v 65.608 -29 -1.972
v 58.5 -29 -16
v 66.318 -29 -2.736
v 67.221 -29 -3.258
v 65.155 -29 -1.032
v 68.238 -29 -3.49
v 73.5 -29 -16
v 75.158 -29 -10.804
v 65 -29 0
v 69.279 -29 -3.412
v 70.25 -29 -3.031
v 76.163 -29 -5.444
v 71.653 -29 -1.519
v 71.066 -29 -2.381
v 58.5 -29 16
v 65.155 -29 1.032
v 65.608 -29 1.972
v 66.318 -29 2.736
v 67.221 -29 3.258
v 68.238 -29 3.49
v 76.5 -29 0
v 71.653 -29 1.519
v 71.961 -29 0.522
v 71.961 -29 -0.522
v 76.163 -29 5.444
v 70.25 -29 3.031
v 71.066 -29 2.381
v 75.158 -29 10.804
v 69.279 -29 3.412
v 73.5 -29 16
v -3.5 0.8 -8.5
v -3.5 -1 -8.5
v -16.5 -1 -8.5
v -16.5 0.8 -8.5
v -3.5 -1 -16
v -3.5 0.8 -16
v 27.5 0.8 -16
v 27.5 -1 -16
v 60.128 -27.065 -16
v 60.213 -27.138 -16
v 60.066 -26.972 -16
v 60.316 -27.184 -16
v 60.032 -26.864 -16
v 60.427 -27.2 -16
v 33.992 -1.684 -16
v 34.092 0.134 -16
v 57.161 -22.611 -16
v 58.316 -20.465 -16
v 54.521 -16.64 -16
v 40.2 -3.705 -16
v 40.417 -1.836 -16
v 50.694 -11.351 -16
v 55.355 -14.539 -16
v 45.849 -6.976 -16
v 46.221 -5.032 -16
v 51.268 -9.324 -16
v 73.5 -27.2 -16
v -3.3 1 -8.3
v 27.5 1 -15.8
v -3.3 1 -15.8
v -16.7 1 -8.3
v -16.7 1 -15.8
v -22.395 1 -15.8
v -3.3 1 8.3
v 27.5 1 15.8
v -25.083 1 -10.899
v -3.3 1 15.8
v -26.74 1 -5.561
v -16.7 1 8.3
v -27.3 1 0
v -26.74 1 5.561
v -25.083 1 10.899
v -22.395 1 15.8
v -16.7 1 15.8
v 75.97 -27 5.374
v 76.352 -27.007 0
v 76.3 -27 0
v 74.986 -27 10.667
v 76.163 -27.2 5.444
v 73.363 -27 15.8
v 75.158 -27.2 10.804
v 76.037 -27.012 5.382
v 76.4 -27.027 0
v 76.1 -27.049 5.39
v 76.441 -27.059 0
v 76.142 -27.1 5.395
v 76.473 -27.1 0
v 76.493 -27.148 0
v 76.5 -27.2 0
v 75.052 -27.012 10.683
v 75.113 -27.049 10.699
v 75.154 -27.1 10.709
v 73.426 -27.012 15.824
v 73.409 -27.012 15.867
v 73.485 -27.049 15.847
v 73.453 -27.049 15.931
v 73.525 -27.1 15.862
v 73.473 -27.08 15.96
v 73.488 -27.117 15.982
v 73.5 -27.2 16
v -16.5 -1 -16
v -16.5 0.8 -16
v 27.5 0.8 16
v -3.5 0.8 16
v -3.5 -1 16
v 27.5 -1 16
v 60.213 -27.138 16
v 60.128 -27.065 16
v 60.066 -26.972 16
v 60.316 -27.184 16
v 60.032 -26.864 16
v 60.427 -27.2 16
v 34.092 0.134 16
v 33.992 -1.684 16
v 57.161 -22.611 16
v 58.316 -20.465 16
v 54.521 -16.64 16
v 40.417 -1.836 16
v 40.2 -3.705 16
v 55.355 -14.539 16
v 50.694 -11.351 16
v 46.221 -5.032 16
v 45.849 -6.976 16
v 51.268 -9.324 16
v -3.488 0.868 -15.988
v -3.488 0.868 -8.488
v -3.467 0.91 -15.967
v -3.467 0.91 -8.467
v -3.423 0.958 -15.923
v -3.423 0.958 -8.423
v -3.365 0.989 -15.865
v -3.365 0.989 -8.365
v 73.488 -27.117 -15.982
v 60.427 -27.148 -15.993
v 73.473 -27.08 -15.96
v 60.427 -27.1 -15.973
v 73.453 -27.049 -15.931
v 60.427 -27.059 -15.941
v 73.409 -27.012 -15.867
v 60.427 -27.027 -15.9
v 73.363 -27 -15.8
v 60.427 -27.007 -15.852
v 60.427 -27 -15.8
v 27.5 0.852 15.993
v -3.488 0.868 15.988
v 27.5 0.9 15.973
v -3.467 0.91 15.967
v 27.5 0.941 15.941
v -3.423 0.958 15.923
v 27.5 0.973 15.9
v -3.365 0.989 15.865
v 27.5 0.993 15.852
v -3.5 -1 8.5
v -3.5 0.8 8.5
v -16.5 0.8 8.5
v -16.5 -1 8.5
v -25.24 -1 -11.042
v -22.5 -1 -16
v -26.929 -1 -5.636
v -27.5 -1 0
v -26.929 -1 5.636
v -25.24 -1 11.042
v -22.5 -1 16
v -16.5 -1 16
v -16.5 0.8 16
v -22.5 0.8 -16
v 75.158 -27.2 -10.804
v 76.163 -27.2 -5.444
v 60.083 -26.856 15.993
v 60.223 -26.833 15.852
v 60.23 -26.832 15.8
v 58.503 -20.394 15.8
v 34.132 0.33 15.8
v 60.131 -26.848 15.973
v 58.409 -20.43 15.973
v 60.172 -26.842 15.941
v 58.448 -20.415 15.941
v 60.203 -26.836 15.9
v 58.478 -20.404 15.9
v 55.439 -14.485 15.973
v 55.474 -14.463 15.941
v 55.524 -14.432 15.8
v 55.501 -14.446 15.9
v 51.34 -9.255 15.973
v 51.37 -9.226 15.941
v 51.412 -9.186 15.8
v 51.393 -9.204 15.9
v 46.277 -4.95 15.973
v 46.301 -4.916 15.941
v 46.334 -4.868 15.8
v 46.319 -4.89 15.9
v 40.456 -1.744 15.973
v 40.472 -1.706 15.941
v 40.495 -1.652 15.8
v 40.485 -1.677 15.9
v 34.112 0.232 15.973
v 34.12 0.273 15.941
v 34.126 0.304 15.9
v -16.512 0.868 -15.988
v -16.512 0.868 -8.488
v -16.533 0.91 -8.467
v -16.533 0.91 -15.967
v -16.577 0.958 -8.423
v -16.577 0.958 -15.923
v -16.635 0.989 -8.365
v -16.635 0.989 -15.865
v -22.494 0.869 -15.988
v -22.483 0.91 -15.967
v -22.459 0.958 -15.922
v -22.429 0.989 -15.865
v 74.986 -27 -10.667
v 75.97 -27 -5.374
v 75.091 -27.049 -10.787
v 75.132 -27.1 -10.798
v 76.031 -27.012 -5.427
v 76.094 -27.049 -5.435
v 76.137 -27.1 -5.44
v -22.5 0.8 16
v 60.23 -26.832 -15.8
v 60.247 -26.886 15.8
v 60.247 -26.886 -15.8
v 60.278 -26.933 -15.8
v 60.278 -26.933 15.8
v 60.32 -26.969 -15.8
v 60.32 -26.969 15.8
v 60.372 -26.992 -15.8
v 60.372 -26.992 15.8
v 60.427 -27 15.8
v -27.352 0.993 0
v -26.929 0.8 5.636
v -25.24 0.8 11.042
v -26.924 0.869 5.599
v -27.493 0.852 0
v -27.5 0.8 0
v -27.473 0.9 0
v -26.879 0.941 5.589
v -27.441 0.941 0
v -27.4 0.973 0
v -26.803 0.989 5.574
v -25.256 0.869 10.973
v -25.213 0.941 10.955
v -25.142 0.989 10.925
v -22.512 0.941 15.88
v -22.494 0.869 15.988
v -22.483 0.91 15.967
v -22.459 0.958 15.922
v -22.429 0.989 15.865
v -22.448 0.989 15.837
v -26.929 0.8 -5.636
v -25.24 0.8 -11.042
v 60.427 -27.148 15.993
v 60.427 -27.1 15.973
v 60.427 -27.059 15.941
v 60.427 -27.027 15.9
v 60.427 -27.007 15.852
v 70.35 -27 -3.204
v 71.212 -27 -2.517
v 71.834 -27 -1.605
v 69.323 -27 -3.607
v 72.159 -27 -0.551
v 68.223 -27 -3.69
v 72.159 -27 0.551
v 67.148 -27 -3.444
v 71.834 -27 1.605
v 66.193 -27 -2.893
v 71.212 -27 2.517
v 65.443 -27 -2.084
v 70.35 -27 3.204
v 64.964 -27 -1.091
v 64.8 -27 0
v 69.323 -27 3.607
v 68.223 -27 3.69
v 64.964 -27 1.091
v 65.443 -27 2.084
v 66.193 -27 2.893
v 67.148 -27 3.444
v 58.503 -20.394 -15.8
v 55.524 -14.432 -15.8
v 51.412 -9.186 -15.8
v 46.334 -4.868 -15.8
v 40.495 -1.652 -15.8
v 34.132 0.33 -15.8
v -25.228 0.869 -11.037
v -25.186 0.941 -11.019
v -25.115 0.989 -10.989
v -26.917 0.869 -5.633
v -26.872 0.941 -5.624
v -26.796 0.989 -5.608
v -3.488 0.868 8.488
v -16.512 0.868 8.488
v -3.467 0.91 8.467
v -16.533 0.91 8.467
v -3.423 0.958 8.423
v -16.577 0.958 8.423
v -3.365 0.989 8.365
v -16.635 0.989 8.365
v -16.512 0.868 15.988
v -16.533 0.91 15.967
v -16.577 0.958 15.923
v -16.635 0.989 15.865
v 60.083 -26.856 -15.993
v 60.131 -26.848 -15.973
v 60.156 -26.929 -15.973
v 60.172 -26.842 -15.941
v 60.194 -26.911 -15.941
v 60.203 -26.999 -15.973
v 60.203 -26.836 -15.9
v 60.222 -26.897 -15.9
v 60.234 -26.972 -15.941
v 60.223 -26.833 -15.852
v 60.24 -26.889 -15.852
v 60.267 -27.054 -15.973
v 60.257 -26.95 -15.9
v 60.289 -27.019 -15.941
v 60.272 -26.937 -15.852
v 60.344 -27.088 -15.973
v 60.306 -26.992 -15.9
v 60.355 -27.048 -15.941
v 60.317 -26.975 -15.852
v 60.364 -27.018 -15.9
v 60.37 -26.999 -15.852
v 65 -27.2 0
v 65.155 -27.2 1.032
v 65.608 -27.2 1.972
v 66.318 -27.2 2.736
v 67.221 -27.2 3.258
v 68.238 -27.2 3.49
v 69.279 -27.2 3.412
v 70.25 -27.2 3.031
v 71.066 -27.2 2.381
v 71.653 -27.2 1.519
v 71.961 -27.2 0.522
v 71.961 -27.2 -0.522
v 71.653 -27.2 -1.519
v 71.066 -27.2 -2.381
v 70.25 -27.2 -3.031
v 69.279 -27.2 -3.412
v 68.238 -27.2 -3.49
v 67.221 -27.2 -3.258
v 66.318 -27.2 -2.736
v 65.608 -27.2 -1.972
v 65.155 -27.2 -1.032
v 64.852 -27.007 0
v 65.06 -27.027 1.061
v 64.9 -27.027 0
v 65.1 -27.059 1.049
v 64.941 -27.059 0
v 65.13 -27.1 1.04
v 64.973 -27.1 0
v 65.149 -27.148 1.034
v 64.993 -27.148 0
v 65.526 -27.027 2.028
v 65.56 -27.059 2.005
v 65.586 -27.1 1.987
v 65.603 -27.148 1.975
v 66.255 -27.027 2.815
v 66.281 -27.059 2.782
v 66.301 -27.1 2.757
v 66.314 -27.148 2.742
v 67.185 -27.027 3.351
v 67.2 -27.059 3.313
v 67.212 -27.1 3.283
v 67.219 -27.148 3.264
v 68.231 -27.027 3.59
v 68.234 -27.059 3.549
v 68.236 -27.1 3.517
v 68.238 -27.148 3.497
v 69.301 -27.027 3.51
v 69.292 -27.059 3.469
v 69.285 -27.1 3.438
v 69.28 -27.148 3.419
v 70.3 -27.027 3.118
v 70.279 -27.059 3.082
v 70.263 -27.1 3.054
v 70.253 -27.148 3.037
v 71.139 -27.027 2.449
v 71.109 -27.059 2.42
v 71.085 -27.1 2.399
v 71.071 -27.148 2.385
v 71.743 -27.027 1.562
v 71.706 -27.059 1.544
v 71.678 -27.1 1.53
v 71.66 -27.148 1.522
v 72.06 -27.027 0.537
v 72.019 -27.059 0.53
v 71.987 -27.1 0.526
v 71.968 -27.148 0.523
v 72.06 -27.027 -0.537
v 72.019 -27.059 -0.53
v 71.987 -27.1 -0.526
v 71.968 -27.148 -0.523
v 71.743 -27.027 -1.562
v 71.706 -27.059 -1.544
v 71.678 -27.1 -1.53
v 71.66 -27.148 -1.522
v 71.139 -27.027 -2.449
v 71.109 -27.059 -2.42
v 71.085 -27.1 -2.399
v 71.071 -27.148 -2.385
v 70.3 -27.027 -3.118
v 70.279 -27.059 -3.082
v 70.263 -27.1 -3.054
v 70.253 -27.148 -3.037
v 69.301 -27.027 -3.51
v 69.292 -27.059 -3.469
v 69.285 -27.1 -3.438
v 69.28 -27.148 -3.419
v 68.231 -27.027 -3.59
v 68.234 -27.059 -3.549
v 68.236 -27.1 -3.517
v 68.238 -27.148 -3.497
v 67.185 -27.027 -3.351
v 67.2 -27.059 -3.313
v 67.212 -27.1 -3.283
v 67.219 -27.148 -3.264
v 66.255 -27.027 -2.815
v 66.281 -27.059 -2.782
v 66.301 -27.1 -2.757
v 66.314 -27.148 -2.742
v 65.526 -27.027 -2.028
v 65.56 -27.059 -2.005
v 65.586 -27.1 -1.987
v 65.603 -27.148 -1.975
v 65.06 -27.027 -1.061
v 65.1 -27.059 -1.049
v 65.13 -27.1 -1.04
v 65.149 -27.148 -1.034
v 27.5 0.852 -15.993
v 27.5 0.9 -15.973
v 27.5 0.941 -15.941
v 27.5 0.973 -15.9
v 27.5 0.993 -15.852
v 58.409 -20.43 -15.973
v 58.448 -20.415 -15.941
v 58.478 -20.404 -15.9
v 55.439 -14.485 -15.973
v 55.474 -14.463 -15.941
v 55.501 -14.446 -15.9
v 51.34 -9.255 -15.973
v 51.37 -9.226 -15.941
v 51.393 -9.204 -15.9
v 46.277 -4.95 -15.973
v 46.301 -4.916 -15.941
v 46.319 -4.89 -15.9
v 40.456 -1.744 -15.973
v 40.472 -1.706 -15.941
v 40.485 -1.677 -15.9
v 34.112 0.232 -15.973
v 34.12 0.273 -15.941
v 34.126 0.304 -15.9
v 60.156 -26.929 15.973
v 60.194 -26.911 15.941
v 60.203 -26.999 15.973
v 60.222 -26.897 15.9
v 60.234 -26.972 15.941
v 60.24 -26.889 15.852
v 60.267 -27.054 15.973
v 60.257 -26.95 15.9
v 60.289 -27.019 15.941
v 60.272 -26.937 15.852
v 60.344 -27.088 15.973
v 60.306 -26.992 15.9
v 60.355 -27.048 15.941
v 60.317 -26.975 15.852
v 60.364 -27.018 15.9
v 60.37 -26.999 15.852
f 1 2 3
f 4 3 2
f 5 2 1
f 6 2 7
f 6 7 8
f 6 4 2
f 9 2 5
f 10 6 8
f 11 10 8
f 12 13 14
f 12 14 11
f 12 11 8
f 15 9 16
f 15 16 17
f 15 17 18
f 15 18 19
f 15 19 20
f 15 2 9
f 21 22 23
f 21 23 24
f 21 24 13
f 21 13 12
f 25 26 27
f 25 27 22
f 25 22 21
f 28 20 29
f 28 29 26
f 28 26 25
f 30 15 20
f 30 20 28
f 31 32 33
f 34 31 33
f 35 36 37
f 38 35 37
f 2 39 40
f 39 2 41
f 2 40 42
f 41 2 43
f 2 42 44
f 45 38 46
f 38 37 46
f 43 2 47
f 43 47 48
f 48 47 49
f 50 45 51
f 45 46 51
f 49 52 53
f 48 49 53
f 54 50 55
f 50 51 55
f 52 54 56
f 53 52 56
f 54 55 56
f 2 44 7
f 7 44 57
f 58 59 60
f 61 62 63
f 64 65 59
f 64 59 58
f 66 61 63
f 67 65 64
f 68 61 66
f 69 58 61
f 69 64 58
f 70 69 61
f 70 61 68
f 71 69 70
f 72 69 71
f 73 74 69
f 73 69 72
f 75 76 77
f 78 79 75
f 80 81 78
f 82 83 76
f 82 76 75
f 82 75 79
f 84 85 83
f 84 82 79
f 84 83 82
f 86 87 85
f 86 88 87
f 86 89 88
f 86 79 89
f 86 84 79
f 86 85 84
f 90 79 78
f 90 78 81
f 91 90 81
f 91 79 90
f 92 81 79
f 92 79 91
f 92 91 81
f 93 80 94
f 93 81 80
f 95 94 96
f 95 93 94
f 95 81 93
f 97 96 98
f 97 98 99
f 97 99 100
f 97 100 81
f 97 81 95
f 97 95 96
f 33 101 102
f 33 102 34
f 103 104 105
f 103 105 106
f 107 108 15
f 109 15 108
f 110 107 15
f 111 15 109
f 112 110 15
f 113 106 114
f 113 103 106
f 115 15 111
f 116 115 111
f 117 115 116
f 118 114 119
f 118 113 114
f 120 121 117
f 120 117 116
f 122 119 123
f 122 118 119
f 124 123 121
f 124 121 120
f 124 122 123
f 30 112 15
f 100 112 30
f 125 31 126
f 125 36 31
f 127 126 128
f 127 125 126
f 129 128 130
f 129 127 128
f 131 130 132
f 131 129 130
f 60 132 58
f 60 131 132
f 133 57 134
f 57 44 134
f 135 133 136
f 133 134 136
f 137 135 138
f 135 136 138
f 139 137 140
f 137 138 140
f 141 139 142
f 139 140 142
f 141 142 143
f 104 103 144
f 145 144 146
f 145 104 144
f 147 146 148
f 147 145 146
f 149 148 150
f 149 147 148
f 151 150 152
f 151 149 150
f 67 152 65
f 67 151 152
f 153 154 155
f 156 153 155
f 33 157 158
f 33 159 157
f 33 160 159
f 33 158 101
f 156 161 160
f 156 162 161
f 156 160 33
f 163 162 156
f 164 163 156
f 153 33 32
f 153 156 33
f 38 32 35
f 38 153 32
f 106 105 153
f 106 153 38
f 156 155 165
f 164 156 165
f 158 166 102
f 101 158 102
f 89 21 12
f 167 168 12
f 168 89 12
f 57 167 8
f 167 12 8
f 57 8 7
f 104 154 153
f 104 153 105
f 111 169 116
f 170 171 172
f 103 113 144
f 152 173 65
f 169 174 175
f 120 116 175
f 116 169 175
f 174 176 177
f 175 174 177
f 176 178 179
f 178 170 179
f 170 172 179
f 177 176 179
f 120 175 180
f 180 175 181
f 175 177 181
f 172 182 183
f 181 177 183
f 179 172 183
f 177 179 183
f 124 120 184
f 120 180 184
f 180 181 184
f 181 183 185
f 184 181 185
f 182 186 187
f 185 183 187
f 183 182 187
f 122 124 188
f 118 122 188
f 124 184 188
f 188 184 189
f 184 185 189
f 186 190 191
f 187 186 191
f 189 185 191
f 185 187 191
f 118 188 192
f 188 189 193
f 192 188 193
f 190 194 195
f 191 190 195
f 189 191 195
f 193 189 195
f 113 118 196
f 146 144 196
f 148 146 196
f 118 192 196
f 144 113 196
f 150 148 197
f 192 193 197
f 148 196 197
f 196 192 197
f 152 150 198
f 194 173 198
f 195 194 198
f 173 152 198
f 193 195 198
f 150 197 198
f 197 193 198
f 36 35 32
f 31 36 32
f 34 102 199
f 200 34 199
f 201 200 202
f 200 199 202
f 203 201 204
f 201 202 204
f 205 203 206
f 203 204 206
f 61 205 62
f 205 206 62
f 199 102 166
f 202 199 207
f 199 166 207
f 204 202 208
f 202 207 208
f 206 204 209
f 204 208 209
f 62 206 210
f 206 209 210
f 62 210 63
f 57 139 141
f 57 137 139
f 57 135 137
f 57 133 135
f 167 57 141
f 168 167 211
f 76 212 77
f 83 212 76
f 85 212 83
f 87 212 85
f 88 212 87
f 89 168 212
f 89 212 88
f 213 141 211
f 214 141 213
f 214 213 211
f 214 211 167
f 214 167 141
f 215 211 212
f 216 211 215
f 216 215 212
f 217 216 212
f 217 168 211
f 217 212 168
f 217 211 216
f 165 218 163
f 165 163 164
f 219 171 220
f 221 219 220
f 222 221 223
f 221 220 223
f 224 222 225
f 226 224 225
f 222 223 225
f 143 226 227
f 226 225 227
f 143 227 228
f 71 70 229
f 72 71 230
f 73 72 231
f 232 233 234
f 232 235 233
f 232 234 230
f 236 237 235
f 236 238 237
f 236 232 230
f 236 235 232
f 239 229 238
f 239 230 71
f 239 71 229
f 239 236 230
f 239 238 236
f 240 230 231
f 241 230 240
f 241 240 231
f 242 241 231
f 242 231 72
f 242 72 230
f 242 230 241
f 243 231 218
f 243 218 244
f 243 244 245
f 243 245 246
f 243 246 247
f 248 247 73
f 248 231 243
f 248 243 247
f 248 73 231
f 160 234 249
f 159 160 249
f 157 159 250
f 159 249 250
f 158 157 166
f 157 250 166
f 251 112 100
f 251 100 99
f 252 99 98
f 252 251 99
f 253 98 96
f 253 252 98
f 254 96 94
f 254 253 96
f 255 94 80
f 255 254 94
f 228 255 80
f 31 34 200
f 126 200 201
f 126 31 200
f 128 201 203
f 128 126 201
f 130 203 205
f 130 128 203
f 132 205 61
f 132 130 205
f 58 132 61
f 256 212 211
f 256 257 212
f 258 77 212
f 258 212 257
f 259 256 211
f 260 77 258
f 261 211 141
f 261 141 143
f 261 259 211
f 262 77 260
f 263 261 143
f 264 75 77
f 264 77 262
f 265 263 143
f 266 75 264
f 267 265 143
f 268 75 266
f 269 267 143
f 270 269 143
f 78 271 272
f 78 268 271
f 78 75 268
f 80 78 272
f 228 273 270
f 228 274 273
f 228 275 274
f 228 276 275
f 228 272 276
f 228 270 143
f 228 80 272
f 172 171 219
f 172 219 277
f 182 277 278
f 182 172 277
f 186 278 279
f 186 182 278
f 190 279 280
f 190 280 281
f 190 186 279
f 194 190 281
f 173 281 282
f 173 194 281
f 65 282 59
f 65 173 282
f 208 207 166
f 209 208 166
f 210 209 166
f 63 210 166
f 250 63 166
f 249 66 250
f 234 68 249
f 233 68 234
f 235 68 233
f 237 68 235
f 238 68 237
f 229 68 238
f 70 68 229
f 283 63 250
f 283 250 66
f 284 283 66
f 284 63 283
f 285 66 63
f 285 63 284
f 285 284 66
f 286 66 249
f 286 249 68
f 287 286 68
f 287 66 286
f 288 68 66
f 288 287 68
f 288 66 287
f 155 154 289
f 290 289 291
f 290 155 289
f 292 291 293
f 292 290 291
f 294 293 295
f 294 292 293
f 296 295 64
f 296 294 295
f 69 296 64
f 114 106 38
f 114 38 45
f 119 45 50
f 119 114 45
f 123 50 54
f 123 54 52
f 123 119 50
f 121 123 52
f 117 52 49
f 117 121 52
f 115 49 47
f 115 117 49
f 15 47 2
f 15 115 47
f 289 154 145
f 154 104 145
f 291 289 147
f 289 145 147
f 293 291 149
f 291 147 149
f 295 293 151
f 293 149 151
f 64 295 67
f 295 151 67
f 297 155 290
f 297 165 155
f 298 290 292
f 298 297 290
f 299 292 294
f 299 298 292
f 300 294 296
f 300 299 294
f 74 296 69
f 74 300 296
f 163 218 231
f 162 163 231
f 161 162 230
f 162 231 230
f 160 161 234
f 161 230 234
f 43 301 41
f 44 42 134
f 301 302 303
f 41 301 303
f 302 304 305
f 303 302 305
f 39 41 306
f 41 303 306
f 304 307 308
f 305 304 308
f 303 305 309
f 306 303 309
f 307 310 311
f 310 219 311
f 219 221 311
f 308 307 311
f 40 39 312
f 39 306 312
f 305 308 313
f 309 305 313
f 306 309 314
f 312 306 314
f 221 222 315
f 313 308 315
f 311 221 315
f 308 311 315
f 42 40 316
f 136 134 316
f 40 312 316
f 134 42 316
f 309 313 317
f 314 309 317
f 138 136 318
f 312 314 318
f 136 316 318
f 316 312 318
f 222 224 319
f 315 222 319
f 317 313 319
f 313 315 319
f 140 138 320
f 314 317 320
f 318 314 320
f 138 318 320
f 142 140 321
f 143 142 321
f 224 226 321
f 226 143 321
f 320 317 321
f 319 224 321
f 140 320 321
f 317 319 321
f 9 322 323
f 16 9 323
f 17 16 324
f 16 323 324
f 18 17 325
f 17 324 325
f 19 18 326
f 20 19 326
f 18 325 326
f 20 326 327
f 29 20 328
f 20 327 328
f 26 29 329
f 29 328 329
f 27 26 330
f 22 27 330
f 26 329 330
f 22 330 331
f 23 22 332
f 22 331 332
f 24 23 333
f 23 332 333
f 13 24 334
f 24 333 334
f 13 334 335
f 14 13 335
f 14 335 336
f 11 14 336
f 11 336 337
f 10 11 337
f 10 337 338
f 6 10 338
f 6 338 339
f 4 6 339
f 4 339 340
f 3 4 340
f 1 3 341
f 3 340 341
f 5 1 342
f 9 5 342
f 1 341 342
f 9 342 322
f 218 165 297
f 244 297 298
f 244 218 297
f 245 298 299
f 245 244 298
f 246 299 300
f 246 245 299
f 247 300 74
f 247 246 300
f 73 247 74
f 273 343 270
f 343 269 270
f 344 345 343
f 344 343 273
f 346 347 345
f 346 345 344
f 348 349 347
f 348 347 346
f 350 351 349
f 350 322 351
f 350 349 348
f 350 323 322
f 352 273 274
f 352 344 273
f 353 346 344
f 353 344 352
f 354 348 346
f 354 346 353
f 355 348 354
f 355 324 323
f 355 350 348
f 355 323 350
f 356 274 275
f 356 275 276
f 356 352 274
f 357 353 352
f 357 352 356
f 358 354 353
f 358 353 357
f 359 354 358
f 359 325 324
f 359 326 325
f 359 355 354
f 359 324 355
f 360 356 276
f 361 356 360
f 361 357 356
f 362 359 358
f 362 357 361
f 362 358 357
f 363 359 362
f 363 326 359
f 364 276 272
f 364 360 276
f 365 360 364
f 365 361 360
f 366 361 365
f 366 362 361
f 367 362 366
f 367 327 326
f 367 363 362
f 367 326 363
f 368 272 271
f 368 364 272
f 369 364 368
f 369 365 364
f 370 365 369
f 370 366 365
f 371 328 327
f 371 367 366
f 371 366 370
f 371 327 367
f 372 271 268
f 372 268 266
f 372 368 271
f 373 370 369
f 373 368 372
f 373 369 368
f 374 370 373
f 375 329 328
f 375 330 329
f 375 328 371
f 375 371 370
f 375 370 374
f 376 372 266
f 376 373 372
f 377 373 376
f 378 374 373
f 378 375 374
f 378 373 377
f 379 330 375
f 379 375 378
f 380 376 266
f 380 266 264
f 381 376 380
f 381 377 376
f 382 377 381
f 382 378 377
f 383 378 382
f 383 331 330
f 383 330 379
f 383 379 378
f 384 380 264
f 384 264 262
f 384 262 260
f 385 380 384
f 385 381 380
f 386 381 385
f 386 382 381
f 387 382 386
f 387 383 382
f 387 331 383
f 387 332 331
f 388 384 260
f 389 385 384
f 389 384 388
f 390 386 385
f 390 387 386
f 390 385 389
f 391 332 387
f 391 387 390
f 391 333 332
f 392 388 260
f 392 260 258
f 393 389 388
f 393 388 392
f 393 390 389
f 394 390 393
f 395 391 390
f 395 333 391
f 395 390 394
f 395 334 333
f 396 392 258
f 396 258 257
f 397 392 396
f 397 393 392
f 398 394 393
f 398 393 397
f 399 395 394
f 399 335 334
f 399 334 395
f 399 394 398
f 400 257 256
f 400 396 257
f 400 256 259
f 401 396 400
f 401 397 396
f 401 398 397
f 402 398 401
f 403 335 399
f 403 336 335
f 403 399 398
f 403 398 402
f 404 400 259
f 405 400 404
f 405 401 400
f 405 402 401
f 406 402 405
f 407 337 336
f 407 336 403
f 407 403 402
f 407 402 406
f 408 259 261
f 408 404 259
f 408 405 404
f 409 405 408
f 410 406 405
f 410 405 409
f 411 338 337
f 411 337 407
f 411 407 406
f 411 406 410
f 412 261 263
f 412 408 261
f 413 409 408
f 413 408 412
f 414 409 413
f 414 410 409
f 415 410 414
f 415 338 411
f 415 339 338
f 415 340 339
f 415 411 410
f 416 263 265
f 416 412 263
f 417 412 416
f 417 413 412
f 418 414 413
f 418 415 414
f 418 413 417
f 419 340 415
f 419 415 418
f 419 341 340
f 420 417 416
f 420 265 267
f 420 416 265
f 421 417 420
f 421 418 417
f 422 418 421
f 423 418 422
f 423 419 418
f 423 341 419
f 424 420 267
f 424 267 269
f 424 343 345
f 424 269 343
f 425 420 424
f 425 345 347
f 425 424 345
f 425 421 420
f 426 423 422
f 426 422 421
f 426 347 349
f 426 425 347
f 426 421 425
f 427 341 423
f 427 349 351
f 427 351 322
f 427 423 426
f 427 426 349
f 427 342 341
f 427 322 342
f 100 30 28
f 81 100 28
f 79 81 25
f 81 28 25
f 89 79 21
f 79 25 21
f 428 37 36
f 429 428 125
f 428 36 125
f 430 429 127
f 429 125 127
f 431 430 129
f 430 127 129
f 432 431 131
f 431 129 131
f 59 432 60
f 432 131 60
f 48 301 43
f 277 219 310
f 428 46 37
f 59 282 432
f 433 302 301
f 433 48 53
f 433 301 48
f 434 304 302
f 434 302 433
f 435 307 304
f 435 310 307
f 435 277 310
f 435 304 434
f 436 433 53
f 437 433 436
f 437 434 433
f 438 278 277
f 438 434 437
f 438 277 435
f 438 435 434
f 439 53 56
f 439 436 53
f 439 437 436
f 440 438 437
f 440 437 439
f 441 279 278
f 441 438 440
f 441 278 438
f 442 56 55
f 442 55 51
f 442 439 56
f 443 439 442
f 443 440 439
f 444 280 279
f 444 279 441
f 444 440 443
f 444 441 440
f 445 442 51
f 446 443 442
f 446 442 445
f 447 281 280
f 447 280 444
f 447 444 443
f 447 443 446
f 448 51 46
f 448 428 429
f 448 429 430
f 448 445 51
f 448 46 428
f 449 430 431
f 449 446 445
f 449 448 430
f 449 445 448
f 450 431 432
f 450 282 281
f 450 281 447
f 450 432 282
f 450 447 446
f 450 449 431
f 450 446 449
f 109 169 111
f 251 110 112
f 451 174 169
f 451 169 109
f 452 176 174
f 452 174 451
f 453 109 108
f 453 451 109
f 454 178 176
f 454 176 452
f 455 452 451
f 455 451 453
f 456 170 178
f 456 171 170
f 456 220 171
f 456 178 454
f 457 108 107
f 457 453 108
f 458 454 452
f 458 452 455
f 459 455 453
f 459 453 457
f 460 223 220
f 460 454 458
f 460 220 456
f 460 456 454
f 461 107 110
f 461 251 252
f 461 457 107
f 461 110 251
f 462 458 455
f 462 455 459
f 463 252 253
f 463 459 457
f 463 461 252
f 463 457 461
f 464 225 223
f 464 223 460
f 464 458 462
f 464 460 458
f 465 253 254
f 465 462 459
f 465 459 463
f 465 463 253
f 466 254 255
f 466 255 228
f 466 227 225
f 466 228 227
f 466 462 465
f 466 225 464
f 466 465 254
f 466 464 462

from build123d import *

# Parameters (mm, degrees)
F1_DEPTH = 16
F3_DEPTH = 12.5
F5_DEPTH = 12.5
F6_W     = 13
F6_H     = 7.5
F7_DEPTH = 12.5
F8_R     = 3.5
F9_DEPTH = 12.5
F10_R    = 0.2


with BuildPart() as f1:
    # F0 (on Top) → F1 (new body, symmetric)
    with BuildSketch(Plane.XY):
        with BuildLine():
            Line((-27.5, -1), (27.5, -1))
            ThreePointArc((27.5, -1), (48.3865985742, -9.0362658643), (58.5, -29))
            Line((58.5, -29), (76.5, -29))
            Line((76.5, -29), (76.5, -27))
            Line((76.5, -27), (60.2566787083, -27))
            ThreePointArc((60.2566787083, -27), (49.0464614264, -6.9539102055), (27.5, 1))
            Line((27.5, 1), (-27.5, 1))
            Line((-27.5, 1), (-27.5, -1))
        make_face()
    extrude(amount=F1_DEPTH, both=True)

    # F2 (on face) → F3 (cut, symmetric)
    with BuildSketch(Plane.XZ.offset(29)):
        with BuildLine():
            Line((76.5, 0), (76.5, 16))
            Line((76.5, 16), (73.5, 16))
            ThreePointArc((73.5, 16), (75.7435215896, 8.139410298), (76.5, 0))
        make_face()
        with BuildLine():
            Line((76.5, -16), (76.5, 0))
            ThreePointArc((76.5, 0), (75.7435215896, -8.139410298), (73.5, -16))
            Line((73.5, -16), (76.5, -16))
        make_face()
    extrude(amount=F3_DEPTH, both=True, mode=Mode.SUBTRACT)

    # F4 (on face) → F5 (cut, symmetric)
    with BuildSketch(Plane(origin=(0, 1, 0), x_dir=(-1, 0, 0), z_dir=(0, 1, 0))):
        with BuildLine():
            Line((27.5, -16), (27.5, -3.42e-08))
            ThreePointArc((27.5, -3.42e-08), (26.2208873777, -8.3815273234), (22.5, -16))
            Line((22.5, -16), (27.5, -16))
        make_face()
        with BuildLine():
            Line((27.5, -3.42e-08), (27.5, 16))
            Line((27.5, 16), (22.5, 16))
            ThreePointArc((22.5, 16), (26.2208873879, 8.3815272908), (27.5, -3.42e-08))
        make_face()
    extrude(amount=F5_DEPTH, both=True, mode=Mode.SUBTRACT)

    # F6 (on face) → F7 (cut, symmetric)
    with BuildSketch(Plane(origin=(0, 1, 0), x_dir=(-1, 0, 0), z_dir=(0, 1, 0))):
        with Locations((10, -12.25)):
            Rectangle(F6_W, F6_H)
        with Locations((10, 12.25)):
            Rectangle(F6_W, F6_H)
    extrude(amount=F7_DEPTH, both=True, mode=Mode.SUBTRACT)

    # F8 (on face) → F9 (cut, symmetric)
    with BuildSketch(Plane(origin=(0, -27, 0), x_dir=(-1, 0, 0), z_dir=(0, 1, 0))):
        with Locations((-68.5, 0)):
            Circle(F8_R)
    extrude(amount=F9_DEPTH, both=True, mode=Mode.SUBTRACT)

    # F10
    f10_edges = [f1.edges().sort_by_distance(p)[0] for p in [
        (76.5, -27, 0),
        (66.878339, -27, 16),
        (66.878339, -27, -16),
        (60.256679, -27, 0),
        (72, -27, 0),
        (49.046461, -6.95391, -16),
        (27.5, 1, 0),
        (49.046461, -6.95391, 16),
        (12, 1, 16),
        (-3.5, 1, 12.25),
        (-10, 1, 8.5),
        (-16.5, 1, 12.25),
        (-19.5, 1, 16),
        (-27.5, 1, 0),
        (-19.5, 1, -16),
        (-16.5, 1, -12.25),
        (-10, 1, -8.5),
        (-3.5, 1, -12.25),
        (12, 1, -16),
    ]]
    fillet(f10_edges, radius=F10_R)


solid = f1.part
